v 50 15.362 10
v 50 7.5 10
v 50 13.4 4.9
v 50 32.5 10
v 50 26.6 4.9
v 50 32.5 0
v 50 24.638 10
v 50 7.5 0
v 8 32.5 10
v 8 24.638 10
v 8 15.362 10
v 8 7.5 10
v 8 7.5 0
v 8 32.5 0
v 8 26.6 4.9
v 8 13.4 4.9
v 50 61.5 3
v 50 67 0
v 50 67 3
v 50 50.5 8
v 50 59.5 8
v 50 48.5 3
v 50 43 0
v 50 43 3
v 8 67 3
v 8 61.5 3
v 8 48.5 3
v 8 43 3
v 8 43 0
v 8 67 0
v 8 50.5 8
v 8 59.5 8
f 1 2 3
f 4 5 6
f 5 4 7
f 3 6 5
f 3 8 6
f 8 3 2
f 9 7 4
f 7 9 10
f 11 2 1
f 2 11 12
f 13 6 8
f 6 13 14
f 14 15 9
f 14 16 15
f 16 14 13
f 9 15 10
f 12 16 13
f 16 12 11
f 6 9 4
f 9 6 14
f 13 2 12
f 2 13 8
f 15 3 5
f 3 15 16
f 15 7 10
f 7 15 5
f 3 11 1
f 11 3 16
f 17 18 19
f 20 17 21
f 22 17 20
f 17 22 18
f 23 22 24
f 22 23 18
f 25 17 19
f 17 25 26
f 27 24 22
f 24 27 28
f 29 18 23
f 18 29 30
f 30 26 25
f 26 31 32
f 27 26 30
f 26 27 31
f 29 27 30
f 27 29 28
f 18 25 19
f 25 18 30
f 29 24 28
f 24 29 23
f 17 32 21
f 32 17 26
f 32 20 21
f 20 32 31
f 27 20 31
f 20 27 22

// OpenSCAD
/*
Sample 050: Schwalbenschwanz-Verbinder — eng 0,10 mm
Generated from the FDM Mechanical Sample Library.
Units: millimetres.

Override examples:
  openscad -o custom.stl -D 'view="plate"' -D 'render_fn=64' model.scad
  openscad -o preview.png -D 'view="assembly"' model.scad
*/
use <../../../library/fdm_mechanisms.scad>

render_fn = is_undef(render_fn) ? 48 : render_fn;
view = is_undef(view) ? "plate" : view;
$fn = render_fn;

sample_dovetail_joiner(
    view=view,
    clearance=0.1,
    length=42
);
